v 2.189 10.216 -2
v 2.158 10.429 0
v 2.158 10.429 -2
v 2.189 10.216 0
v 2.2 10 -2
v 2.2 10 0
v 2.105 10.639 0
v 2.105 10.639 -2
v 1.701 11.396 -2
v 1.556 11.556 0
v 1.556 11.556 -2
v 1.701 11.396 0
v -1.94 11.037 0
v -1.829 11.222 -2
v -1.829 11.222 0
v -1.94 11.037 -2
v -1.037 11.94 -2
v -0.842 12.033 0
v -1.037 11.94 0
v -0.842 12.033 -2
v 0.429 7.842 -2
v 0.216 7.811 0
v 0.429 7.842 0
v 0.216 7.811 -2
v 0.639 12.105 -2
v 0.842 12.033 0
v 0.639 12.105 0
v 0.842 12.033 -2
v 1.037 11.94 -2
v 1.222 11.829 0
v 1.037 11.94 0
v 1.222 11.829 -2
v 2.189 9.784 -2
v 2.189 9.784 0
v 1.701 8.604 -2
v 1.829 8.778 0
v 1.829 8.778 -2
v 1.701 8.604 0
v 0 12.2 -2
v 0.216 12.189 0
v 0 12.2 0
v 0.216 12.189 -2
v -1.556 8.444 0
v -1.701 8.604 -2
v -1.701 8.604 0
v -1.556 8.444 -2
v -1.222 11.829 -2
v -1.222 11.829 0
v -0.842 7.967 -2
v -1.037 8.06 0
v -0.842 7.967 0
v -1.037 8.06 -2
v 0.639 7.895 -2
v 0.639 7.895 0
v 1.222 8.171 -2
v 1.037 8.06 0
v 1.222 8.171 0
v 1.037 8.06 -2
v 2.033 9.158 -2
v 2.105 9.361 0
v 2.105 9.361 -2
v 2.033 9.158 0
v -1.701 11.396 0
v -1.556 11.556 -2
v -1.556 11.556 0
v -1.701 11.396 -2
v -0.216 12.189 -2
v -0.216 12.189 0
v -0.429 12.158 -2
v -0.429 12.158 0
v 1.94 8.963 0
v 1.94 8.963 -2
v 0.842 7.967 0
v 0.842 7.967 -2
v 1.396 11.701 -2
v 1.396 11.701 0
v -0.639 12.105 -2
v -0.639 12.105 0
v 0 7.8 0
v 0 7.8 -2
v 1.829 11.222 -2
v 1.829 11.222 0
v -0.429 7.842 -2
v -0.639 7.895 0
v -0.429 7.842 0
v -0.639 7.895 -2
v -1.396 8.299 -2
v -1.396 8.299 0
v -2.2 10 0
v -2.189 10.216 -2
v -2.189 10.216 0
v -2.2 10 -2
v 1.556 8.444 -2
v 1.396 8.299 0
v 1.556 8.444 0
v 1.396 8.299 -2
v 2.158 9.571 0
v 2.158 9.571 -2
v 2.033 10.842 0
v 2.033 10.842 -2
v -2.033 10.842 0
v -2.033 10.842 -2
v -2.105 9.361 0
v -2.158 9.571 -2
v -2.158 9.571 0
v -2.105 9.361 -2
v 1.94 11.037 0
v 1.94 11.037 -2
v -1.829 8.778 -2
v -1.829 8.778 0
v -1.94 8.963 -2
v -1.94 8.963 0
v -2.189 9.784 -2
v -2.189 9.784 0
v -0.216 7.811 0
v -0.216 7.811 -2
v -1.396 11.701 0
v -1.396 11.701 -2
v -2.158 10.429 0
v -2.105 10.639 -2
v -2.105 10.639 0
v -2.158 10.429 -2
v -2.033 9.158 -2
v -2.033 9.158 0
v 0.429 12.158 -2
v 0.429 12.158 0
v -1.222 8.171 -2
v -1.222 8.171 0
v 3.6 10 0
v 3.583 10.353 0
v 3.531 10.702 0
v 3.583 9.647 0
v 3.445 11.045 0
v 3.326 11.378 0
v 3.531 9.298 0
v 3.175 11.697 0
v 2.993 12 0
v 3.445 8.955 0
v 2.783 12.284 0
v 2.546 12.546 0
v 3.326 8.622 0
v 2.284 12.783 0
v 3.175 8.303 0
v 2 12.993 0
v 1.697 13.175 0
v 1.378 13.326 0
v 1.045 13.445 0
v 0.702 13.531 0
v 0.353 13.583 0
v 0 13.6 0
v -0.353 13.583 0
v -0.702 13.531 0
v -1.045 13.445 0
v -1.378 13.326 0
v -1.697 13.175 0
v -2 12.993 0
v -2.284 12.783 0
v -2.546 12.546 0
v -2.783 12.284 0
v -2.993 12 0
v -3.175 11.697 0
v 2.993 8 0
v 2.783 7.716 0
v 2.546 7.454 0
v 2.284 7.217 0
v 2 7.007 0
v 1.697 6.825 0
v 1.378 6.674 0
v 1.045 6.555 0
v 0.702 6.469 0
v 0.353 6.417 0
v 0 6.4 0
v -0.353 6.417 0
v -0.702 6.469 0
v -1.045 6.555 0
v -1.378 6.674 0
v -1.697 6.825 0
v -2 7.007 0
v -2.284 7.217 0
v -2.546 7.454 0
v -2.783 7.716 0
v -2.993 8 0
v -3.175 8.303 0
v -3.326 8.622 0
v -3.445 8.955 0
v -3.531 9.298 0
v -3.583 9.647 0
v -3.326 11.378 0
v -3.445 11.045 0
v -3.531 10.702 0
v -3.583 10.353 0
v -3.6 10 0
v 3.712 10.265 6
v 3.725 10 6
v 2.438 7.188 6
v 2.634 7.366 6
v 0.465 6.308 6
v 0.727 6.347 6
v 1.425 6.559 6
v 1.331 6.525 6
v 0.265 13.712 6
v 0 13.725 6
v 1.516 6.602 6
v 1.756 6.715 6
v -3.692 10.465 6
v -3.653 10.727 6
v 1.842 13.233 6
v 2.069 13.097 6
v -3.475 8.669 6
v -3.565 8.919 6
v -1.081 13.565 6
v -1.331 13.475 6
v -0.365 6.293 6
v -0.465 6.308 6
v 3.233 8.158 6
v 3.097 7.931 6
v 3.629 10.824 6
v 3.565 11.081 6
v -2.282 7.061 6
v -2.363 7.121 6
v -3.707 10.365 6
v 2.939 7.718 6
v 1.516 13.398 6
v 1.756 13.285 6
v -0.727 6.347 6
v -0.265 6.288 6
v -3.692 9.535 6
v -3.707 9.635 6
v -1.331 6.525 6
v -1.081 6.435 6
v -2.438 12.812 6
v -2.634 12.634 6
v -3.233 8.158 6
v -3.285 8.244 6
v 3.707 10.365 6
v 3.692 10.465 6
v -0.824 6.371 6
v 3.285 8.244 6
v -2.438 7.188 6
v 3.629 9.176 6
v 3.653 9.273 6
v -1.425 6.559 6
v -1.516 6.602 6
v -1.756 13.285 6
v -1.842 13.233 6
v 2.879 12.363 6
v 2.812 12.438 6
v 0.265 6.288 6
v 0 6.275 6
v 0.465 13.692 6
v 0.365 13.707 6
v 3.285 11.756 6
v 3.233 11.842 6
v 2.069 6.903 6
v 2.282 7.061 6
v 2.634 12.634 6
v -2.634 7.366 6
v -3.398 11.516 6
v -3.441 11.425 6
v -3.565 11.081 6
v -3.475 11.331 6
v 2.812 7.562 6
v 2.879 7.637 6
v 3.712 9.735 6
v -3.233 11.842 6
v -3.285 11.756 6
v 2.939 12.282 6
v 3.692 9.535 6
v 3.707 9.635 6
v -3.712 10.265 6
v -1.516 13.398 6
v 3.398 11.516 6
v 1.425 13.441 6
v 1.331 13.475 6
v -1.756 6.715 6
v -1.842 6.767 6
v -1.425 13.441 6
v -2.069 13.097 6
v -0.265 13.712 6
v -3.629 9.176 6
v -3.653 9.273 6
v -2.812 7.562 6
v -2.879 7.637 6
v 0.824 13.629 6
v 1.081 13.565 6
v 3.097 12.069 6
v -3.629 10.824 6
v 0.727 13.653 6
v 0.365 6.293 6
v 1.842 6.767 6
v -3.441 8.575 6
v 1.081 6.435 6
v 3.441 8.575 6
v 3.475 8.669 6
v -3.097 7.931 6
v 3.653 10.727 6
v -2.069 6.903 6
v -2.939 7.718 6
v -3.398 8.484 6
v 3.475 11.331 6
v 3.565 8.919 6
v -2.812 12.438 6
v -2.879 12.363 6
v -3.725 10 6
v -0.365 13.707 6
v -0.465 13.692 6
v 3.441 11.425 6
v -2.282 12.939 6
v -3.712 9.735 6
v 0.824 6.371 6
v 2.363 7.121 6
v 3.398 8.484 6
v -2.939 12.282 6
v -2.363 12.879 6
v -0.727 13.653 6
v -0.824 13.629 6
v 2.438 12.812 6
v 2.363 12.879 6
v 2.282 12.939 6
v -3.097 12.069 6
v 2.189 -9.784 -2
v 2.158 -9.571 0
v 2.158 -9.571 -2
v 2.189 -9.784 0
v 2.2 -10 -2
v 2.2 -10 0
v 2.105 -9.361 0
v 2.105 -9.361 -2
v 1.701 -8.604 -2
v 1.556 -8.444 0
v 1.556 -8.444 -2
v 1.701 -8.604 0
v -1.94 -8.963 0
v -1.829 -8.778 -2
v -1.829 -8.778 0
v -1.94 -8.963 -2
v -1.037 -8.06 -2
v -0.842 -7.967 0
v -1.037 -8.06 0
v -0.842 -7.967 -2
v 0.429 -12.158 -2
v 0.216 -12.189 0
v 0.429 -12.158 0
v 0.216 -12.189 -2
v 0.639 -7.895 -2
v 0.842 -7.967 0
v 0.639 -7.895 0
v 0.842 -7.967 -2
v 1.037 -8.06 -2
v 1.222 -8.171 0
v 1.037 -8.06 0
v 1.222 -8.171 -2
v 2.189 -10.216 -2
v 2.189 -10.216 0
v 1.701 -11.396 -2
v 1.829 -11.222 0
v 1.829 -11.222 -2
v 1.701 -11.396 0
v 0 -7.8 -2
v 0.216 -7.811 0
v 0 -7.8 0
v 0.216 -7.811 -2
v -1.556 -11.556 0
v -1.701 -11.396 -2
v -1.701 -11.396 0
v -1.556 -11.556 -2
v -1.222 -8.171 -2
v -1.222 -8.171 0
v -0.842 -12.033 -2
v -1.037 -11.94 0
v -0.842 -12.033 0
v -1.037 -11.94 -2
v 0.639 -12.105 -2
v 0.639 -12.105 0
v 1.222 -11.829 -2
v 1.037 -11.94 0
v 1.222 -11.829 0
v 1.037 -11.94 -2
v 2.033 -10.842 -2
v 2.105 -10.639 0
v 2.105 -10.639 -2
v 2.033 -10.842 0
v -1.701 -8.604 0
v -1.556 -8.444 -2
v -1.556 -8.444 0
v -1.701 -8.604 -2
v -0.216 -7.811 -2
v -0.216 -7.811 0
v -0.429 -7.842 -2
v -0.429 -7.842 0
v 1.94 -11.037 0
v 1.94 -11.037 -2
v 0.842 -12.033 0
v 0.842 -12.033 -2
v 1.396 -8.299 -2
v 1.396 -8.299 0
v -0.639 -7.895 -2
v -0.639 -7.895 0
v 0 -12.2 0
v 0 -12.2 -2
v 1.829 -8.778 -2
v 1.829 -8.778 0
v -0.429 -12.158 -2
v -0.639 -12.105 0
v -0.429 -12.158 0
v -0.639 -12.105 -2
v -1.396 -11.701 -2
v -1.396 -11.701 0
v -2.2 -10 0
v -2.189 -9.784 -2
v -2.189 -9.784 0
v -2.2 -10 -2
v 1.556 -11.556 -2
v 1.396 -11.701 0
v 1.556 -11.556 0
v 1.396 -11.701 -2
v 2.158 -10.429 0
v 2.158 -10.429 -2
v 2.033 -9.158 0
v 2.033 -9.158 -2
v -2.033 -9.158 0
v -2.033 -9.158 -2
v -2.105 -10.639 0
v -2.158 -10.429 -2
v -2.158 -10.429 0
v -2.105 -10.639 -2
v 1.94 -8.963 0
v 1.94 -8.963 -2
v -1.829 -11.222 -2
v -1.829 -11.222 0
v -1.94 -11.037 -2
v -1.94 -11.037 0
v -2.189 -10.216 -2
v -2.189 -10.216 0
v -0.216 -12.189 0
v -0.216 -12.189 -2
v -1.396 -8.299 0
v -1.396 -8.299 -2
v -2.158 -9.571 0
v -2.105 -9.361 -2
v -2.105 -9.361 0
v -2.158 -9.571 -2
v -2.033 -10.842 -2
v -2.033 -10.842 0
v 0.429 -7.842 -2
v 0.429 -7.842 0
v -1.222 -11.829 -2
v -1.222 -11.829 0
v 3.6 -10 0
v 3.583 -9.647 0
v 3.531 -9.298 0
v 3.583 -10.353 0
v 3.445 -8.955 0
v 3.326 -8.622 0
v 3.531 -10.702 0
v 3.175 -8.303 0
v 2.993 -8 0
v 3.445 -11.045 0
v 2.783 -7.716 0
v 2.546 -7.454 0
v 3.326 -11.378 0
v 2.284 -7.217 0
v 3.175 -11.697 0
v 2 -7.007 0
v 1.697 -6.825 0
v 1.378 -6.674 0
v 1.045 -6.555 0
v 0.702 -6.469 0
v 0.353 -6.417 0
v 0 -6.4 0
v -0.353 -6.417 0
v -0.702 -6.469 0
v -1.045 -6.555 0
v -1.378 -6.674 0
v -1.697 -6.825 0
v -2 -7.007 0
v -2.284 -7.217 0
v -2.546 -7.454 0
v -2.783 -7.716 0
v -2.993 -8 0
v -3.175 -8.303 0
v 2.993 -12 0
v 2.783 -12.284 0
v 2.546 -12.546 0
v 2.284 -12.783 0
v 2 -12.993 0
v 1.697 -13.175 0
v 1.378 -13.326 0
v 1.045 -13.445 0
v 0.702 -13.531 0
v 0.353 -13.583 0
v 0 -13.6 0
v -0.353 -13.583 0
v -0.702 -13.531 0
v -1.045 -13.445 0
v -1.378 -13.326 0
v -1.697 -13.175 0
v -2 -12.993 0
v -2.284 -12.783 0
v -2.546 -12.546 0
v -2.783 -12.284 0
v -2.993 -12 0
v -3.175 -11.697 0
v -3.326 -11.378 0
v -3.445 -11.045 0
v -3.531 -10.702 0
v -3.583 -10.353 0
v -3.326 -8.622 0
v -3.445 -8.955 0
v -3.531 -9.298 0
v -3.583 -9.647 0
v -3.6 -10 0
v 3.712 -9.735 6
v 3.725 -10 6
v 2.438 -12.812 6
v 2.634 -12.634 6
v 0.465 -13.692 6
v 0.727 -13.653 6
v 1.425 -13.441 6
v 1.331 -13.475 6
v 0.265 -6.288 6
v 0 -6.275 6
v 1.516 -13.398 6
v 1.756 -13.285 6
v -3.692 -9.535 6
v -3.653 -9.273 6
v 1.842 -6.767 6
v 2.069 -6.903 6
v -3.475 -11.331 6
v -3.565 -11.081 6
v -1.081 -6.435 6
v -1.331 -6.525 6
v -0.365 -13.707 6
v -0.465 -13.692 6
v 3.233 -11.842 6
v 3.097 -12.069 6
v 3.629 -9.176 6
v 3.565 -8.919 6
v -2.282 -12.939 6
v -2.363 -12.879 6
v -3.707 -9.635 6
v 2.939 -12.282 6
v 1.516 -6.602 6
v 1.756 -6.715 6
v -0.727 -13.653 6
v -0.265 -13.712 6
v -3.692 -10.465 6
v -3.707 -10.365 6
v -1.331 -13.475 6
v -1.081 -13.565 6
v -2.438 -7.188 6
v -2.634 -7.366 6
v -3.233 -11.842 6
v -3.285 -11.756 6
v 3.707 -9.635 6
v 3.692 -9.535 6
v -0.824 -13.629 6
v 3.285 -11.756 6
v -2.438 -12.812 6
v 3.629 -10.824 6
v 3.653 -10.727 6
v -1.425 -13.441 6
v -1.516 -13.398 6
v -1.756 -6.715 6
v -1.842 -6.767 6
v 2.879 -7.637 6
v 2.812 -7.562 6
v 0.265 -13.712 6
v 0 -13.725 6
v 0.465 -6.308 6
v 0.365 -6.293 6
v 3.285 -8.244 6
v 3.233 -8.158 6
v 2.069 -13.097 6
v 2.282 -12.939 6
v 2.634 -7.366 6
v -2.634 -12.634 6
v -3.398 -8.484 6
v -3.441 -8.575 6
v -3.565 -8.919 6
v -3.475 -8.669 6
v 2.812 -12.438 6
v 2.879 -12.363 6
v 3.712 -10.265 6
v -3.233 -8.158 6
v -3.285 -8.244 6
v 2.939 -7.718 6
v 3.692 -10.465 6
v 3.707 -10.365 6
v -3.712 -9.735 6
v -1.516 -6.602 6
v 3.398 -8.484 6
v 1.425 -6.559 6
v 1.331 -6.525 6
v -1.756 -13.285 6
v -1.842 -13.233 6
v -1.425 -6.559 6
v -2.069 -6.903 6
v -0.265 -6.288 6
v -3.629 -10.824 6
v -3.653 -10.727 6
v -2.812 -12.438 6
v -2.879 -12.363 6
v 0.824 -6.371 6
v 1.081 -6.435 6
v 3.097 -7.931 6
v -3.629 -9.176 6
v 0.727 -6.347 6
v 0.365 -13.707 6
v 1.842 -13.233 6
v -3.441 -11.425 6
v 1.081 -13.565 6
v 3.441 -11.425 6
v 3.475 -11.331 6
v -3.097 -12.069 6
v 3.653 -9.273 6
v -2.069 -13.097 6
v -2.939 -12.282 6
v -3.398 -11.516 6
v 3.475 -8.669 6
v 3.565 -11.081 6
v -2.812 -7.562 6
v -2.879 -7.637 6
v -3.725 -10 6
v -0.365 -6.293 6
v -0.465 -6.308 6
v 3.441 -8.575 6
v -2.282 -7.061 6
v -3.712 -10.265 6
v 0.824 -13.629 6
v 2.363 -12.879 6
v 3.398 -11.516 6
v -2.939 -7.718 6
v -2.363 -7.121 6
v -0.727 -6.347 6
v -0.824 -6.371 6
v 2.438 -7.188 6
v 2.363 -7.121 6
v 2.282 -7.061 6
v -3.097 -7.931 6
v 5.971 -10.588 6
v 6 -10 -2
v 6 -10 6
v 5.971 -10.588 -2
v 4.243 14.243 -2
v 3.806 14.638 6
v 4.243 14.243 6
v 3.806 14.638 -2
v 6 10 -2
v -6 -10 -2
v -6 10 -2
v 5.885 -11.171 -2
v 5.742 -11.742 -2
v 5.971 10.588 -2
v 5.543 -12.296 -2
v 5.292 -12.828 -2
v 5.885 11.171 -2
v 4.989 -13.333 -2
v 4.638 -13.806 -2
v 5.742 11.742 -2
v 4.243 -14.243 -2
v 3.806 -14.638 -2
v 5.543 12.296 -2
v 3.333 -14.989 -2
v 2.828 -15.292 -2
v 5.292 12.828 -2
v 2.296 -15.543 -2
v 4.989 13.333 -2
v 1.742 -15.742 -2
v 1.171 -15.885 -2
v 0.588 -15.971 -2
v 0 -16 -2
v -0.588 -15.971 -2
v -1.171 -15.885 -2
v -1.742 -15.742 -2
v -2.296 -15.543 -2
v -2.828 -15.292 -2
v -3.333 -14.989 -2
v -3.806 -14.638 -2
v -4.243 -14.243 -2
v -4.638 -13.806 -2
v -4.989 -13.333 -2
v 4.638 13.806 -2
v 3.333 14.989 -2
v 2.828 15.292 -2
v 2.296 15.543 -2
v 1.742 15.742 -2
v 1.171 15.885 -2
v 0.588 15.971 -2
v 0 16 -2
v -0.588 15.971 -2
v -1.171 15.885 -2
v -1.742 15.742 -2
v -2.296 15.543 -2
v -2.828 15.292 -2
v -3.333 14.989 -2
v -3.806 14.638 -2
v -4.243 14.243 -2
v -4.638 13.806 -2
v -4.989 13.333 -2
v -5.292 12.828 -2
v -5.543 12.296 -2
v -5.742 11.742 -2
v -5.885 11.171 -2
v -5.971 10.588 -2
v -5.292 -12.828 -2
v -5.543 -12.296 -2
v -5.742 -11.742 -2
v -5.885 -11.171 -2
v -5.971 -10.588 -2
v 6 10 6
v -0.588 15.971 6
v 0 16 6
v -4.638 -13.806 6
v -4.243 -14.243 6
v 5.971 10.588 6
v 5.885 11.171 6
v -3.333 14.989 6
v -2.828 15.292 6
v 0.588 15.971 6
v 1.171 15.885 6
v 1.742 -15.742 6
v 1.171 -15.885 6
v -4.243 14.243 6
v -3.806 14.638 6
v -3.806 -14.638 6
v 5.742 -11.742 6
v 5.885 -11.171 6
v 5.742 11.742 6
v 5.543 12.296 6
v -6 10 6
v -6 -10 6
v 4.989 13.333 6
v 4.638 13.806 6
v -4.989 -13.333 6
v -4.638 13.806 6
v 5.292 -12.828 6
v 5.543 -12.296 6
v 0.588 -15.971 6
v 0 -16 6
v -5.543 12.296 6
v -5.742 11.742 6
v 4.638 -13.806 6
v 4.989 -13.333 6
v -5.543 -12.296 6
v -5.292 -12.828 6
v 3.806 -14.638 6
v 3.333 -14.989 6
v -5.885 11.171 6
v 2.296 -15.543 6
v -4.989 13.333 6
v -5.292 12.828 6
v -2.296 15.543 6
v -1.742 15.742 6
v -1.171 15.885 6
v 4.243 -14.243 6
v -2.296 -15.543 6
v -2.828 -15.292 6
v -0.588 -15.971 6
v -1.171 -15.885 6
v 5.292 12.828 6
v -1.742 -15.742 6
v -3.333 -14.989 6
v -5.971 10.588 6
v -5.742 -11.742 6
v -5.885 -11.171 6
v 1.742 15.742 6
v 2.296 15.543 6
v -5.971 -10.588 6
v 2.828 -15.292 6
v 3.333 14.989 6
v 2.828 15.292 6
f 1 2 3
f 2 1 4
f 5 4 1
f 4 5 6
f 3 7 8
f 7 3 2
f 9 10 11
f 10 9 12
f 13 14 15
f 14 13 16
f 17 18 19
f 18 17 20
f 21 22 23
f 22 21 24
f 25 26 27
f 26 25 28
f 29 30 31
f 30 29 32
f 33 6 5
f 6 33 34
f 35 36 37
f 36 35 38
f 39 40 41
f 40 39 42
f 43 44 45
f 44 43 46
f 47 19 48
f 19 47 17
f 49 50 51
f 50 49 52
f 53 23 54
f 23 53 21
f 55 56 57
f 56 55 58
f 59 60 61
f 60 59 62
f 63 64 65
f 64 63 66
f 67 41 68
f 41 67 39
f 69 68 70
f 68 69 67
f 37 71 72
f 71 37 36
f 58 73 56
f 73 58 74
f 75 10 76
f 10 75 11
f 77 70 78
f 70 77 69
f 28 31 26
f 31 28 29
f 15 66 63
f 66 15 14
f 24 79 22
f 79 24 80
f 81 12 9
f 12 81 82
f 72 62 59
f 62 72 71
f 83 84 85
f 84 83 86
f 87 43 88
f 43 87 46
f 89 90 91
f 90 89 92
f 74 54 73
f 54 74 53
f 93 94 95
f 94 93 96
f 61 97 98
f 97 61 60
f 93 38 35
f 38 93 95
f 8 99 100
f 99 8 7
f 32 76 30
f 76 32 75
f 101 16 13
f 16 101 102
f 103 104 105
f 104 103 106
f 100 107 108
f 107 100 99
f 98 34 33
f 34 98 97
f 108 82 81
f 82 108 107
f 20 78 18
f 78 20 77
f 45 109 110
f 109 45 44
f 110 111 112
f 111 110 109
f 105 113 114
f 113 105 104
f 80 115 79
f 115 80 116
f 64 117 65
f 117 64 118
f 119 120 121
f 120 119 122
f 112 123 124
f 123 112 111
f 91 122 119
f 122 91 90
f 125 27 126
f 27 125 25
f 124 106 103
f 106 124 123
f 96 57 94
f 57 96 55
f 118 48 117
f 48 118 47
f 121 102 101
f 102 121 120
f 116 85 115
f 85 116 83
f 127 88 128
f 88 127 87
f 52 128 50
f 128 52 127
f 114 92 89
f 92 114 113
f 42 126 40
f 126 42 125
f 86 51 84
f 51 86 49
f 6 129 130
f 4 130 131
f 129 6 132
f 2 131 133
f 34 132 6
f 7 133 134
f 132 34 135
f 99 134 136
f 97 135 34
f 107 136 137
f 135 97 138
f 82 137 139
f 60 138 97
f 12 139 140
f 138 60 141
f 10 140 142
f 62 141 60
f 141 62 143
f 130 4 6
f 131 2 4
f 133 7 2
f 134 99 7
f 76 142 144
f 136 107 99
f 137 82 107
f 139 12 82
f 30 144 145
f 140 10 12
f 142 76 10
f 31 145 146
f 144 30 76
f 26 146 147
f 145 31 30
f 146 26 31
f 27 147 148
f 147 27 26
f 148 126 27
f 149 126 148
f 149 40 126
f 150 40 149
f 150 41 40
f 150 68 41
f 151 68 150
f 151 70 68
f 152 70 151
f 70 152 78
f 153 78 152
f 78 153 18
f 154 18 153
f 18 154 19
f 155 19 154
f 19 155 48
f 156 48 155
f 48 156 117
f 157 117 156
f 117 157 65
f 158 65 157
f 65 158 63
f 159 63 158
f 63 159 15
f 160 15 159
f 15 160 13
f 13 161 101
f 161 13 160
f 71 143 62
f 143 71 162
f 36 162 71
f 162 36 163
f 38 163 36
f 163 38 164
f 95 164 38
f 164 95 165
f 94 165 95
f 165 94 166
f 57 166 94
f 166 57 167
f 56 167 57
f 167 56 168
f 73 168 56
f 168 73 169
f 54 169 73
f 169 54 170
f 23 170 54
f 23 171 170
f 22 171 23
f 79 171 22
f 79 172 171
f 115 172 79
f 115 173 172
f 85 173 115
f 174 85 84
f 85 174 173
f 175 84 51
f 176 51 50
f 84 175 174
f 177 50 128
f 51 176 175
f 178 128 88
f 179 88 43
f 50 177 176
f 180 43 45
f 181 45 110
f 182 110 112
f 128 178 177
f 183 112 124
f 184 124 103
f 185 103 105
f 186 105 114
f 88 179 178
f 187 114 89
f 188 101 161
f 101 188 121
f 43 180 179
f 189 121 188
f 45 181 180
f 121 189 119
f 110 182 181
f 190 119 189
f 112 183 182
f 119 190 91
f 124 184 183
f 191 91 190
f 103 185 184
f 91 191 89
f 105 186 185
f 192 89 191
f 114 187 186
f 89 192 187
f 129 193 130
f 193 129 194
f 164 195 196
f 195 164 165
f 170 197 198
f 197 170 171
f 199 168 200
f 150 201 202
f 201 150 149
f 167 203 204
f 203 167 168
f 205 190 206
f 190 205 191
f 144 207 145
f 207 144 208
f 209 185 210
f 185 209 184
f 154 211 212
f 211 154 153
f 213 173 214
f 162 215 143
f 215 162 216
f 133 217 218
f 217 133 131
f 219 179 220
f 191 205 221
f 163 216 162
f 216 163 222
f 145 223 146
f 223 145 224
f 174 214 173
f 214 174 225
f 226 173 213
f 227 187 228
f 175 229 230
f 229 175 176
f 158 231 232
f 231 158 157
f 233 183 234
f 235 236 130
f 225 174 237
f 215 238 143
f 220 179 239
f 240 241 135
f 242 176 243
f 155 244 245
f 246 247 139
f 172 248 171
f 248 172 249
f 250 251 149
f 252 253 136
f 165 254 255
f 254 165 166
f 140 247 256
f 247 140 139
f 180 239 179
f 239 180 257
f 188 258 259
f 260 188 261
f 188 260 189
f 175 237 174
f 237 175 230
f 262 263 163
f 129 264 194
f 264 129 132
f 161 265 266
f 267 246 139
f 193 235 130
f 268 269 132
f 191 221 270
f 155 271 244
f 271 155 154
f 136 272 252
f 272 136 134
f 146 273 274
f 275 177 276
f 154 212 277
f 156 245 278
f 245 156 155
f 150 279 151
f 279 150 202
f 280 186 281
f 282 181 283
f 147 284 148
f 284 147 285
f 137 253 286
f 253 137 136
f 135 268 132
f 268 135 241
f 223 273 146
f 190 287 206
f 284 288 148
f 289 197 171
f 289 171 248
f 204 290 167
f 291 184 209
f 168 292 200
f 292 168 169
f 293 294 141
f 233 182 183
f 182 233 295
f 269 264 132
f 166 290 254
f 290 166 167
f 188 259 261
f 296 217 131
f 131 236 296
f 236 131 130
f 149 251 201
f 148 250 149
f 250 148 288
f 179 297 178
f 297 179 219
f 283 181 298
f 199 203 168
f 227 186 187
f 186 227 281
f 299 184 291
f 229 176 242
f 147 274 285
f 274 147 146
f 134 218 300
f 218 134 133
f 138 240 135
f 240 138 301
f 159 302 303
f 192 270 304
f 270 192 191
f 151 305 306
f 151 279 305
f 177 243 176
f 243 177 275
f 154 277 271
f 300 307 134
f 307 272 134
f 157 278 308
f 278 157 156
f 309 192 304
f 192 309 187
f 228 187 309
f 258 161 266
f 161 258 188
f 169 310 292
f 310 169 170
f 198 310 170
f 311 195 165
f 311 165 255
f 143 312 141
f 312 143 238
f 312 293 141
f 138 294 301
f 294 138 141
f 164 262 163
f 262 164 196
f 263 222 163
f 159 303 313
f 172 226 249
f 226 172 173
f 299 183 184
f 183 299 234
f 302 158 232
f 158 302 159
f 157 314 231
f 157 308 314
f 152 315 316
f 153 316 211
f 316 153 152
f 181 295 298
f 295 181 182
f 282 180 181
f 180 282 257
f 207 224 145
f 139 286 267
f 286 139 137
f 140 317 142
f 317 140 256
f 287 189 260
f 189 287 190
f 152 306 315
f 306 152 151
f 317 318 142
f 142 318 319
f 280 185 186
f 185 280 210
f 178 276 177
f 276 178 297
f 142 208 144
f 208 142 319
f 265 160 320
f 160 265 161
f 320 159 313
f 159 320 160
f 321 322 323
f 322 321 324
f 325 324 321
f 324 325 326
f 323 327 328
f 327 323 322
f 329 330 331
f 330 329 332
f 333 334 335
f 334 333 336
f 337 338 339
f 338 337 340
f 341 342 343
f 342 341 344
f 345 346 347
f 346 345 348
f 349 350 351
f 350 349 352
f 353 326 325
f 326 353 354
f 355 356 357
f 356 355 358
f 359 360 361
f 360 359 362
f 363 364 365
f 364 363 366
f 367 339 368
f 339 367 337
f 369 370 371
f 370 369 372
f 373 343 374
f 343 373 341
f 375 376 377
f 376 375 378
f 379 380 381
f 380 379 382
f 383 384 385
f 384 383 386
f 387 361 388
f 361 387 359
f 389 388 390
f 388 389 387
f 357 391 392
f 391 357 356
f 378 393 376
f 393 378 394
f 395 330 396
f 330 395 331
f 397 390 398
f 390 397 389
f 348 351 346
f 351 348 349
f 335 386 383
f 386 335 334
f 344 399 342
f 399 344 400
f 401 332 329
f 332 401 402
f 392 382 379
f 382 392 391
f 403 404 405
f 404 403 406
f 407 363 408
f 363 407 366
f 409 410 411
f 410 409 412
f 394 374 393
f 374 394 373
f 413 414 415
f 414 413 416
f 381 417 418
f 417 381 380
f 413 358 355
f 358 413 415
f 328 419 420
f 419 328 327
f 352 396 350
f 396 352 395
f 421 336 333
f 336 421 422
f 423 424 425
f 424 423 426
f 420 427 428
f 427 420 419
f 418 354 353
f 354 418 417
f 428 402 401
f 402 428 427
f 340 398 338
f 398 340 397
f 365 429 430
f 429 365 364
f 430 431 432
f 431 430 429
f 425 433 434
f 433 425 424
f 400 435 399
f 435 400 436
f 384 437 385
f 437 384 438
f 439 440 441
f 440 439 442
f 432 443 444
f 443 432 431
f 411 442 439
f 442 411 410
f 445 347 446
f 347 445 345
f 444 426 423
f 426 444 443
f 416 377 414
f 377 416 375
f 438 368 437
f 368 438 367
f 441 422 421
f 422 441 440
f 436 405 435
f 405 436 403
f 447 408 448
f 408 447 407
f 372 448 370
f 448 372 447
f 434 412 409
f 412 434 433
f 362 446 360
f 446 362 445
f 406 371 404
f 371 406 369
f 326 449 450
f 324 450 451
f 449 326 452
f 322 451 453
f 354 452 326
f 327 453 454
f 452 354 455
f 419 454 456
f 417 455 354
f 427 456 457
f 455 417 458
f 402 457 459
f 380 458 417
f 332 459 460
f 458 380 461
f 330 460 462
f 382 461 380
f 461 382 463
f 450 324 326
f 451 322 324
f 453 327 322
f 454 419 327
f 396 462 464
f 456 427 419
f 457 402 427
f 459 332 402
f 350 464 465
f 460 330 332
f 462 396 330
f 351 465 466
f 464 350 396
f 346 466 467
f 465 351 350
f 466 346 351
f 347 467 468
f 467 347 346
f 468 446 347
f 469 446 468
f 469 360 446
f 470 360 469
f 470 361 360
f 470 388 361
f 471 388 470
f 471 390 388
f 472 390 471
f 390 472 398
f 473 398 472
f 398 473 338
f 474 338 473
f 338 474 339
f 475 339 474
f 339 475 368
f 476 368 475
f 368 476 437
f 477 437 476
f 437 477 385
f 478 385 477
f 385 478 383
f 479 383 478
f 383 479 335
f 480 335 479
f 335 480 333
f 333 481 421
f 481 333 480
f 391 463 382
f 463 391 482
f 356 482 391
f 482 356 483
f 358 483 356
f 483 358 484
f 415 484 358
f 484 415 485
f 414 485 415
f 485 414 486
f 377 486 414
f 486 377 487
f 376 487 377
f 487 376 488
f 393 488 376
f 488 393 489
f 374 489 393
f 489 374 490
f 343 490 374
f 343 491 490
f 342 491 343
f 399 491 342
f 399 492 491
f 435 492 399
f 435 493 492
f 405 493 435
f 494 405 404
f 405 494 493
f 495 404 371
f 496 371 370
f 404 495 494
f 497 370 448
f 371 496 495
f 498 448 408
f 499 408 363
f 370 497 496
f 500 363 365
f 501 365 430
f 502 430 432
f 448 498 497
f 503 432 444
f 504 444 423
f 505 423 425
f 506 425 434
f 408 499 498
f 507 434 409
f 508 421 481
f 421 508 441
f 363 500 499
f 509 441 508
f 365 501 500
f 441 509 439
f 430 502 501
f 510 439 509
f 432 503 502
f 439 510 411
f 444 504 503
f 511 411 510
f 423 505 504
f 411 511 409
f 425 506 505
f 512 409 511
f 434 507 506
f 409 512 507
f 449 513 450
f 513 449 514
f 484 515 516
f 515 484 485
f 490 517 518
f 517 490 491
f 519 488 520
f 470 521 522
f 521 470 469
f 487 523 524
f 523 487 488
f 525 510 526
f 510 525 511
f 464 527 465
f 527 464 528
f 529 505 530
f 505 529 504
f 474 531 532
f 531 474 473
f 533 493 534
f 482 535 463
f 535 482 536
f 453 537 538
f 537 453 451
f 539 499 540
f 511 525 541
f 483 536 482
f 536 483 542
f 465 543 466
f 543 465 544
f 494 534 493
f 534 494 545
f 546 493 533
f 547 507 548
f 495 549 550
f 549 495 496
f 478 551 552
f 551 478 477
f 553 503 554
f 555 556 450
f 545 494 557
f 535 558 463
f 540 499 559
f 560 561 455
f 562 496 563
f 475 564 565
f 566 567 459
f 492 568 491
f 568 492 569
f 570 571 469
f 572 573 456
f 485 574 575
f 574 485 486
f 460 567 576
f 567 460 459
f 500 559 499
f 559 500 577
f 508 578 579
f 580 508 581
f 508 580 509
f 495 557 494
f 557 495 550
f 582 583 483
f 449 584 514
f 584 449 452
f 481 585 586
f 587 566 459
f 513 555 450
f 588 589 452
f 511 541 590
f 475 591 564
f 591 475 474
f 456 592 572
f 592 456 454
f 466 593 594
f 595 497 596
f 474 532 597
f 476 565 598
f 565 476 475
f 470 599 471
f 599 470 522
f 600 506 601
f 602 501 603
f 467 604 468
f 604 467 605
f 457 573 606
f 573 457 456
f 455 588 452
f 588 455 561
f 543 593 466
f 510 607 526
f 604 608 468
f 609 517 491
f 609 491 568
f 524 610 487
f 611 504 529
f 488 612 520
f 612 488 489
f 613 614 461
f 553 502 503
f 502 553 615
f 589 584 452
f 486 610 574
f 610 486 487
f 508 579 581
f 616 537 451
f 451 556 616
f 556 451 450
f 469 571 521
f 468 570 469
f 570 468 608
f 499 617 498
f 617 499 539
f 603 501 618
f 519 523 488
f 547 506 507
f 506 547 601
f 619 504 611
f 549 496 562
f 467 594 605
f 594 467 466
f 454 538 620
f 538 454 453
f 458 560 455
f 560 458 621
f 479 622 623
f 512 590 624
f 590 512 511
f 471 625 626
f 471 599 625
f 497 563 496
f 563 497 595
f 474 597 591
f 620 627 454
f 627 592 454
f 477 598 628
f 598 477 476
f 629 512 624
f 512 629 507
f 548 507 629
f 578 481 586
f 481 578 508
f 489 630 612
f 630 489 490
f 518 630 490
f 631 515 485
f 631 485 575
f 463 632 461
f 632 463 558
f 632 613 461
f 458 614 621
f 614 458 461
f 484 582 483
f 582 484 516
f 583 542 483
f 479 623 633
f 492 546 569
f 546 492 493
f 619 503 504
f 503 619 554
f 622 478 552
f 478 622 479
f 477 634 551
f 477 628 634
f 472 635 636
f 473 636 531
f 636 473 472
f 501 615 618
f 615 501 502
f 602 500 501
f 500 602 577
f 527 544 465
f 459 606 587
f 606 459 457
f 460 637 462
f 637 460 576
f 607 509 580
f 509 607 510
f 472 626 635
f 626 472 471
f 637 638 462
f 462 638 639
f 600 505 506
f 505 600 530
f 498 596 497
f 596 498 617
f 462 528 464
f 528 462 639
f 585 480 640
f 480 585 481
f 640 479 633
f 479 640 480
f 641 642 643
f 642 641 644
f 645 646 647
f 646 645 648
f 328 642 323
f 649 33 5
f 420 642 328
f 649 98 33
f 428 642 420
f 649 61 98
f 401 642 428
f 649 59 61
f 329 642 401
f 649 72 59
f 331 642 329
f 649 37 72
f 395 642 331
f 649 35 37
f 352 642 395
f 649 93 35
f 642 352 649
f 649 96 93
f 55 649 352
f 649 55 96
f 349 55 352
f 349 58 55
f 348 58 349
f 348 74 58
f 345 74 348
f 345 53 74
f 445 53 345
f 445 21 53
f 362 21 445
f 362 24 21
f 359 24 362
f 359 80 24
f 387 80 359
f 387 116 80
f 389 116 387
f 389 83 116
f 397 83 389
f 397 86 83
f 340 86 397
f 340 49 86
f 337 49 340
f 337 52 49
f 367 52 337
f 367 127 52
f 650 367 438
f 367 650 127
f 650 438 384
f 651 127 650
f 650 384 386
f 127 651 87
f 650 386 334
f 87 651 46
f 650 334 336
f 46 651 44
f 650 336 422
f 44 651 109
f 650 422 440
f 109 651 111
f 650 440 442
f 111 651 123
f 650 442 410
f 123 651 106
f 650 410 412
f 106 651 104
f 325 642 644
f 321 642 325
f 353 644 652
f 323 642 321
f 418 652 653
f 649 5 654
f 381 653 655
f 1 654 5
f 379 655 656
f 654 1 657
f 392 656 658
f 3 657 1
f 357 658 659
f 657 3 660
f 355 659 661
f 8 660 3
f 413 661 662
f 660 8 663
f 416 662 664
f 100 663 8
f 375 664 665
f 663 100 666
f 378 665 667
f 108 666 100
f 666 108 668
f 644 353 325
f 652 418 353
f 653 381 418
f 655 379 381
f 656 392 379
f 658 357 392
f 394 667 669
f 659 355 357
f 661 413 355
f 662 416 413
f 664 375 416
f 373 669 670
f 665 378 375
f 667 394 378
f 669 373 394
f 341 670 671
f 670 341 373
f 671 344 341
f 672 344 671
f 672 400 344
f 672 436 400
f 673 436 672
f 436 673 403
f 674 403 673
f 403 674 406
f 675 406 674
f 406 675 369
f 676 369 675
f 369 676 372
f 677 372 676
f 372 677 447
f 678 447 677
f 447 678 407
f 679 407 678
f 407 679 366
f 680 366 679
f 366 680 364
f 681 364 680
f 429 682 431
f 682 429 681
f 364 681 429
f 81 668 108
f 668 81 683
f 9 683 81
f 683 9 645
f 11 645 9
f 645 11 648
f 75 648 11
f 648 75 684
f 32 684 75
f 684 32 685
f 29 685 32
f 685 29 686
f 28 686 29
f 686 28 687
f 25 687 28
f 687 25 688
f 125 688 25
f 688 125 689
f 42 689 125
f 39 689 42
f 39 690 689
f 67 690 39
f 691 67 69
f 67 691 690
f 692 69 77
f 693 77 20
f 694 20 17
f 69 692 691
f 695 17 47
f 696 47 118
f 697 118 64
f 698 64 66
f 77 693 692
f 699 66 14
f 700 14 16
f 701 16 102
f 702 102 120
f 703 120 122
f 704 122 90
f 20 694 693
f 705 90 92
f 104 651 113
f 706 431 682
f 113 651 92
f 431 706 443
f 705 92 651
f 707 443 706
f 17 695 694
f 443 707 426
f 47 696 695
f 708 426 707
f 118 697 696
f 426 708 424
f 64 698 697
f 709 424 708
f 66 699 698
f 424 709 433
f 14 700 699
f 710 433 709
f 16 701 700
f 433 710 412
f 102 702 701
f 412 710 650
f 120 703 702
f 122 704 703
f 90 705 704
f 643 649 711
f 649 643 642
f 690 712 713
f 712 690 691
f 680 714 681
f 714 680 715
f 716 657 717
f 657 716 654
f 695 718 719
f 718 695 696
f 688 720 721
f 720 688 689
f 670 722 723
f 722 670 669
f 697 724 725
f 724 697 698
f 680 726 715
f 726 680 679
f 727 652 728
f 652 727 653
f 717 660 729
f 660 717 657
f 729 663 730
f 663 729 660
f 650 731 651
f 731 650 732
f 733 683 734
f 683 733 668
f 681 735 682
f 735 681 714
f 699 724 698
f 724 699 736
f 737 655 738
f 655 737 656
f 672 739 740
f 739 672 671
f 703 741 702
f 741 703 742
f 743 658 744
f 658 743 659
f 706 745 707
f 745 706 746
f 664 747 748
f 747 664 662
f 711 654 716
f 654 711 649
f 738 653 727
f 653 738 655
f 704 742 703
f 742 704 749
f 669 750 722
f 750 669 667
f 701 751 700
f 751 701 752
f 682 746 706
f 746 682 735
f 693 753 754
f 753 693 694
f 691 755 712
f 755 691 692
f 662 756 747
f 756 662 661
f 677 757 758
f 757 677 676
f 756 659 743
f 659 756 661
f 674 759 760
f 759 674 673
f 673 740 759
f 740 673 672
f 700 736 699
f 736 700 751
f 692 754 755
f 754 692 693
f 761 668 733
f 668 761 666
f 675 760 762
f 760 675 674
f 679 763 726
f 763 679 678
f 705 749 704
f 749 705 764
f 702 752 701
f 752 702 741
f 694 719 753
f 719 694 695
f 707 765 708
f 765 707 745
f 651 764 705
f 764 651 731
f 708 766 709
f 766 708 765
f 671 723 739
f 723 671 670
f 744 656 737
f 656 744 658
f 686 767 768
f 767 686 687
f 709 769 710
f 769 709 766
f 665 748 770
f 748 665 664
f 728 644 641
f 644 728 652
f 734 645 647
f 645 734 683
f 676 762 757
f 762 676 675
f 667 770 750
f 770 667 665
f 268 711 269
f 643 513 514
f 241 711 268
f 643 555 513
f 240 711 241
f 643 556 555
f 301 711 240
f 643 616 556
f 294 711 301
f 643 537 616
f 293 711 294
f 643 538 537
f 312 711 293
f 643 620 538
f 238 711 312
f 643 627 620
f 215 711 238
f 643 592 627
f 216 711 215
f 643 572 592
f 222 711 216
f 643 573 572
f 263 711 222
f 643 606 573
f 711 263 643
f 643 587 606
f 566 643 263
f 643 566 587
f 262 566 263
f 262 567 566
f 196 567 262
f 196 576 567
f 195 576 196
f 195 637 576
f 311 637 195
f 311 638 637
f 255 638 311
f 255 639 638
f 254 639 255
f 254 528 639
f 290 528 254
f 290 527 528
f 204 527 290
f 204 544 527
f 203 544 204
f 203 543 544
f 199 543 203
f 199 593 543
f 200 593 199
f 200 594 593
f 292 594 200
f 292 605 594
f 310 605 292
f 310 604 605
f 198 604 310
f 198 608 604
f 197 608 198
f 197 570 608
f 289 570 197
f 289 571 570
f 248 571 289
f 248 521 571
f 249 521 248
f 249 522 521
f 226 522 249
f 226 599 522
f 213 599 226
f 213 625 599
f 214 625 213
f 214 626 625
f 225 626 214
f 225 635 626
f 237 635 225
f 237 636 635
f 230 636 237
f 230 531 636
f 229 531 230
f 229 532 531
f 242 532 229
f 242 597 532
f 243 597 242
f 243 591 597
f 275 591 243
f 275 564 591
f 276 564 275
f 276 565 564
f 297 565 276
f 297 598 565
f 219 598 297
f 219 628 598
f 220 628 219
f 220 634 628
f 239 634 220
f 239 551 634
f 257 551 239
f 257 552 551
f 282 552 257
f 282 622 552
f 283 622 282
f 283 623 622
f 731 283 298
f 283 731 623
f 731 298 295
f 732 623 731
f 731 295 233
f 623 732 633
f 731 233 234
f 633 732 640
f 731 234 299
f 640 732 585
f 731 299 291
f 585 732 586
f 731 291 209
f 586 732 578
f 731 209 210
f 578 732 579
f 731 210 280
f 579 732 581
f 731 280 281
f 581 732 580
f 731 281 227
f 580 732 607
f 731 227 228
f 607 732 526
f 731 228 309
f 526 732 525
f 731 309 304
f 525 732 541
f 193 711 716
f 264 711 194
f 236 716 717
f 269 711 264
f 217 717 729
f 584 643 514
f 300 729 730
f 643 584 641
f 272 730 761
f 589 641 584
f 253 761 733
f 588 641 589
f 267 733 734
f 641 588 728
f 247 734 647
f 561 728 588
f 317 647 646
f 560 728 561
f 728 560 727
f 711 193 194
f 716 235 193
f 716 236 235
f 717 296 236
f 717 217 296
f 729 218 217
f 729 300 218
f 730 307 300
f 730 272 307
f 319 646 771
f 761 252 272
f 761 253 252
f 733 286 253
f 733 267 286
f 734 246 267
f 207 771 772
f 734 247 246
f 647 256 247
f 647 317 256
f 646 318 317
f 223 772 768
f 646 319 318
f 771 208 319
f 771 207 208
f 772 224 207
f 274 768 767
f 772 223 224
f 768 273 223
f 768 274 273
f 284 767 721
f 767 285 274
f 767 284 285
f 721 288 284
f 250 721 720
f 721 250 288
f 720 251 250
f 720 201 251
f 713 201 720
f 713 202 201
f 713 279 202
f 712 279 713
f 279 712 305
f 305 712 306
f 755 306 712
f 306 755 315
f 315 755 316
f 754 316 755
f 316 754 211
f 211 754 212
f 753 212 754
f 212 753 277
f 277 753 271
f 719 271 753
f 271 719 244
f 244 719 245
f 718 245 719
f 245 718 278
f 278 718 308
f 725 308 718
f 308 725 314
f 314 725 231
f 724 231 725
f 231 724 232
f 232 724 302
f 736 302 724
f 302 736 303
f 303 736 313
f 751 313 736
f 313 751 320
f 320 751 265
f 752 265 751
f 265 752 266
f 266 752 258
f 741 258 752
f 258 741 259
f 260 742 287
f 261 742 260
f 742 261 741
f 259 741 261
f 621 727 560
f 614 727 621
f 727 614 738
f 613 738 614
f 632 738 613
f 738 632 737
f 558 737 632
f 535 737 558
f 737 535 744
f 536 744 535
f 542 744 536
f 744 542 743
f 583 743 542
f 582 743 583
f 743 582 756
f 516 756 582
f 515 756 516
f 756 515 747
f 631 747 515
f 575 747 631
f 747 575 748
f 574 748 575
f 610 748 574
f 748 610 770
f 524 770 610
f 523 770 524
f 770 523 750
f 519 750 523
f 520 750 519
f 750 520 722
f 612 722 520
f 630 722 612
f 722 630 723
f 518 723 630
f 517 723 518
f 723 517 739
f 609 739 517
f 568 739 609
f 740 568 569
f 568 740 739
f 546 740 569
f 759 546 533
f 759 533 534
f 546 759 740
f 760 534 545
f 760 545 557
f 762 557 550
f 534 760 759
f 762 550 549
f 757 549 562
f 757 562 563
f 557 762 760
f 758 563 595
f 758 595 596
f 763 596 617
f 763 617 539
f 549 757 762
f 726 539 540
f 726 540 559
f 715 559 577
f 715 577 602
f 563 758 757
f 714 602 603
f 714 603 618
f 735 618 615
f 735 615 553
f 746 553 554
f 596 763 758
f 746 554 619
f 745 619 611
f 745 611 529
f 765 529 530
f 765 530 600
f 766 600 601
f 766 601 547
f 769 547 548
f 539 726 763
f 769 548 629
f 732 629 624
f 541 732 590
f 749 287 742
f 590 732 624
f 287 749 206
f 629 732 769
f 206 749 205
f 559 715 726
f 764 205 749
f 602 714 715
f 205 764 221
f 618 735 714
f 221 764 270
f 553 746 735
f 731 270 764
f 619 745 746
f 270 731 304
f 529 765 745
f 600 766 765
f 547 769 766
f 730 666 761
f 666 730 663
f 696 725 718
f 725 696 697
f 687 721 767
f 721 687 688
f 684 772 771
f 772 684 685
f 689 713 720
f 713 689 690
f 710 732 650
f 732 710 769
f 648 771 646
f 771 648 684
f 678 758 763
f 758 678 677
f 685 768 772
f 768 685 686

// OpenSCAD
/**
 * Martin Egli
 * 2022-11-01
 */

module plug4mm(loc_res = 32) {
    color("Silver")
    translate([0, 0, -4])
    cylinder(d = 4, h = 4, $fn = loc_res);
    color("Red")
    translate([0, 0, 0])
    cylinder(d1 = 7, d2 = 8, h = 24, $fn = loc_res);
}

module plug4mm_cut(loc_res = 32) {
    translate([0, 0, -4])
    cylinder(d = 4.4, h = 4, $fn = loc_res);
    translate([0, 0, 0])
    cylinder(d1 = 7.2, d2 = 8.2, h = 24, $fn = loc_res);
}

module plug4mm_holder(loc_res = 32) {
    difference() {
        hull() {
            translate([0, +10, -2])
            cylinder(d = 12, h = 8, $fn = loc_res);
            translate([0, -10, -2])
            cylinder(d = 12, h = 8, $fn = loc_res);
        }
        translate([0, +10, 0])
        plug4mm_cut(loc_res);
        translate([0, -10, 0])
        plug4mm_cut(loc_res);
    }
}

// print
plug4mm_holder(64); // 1x
